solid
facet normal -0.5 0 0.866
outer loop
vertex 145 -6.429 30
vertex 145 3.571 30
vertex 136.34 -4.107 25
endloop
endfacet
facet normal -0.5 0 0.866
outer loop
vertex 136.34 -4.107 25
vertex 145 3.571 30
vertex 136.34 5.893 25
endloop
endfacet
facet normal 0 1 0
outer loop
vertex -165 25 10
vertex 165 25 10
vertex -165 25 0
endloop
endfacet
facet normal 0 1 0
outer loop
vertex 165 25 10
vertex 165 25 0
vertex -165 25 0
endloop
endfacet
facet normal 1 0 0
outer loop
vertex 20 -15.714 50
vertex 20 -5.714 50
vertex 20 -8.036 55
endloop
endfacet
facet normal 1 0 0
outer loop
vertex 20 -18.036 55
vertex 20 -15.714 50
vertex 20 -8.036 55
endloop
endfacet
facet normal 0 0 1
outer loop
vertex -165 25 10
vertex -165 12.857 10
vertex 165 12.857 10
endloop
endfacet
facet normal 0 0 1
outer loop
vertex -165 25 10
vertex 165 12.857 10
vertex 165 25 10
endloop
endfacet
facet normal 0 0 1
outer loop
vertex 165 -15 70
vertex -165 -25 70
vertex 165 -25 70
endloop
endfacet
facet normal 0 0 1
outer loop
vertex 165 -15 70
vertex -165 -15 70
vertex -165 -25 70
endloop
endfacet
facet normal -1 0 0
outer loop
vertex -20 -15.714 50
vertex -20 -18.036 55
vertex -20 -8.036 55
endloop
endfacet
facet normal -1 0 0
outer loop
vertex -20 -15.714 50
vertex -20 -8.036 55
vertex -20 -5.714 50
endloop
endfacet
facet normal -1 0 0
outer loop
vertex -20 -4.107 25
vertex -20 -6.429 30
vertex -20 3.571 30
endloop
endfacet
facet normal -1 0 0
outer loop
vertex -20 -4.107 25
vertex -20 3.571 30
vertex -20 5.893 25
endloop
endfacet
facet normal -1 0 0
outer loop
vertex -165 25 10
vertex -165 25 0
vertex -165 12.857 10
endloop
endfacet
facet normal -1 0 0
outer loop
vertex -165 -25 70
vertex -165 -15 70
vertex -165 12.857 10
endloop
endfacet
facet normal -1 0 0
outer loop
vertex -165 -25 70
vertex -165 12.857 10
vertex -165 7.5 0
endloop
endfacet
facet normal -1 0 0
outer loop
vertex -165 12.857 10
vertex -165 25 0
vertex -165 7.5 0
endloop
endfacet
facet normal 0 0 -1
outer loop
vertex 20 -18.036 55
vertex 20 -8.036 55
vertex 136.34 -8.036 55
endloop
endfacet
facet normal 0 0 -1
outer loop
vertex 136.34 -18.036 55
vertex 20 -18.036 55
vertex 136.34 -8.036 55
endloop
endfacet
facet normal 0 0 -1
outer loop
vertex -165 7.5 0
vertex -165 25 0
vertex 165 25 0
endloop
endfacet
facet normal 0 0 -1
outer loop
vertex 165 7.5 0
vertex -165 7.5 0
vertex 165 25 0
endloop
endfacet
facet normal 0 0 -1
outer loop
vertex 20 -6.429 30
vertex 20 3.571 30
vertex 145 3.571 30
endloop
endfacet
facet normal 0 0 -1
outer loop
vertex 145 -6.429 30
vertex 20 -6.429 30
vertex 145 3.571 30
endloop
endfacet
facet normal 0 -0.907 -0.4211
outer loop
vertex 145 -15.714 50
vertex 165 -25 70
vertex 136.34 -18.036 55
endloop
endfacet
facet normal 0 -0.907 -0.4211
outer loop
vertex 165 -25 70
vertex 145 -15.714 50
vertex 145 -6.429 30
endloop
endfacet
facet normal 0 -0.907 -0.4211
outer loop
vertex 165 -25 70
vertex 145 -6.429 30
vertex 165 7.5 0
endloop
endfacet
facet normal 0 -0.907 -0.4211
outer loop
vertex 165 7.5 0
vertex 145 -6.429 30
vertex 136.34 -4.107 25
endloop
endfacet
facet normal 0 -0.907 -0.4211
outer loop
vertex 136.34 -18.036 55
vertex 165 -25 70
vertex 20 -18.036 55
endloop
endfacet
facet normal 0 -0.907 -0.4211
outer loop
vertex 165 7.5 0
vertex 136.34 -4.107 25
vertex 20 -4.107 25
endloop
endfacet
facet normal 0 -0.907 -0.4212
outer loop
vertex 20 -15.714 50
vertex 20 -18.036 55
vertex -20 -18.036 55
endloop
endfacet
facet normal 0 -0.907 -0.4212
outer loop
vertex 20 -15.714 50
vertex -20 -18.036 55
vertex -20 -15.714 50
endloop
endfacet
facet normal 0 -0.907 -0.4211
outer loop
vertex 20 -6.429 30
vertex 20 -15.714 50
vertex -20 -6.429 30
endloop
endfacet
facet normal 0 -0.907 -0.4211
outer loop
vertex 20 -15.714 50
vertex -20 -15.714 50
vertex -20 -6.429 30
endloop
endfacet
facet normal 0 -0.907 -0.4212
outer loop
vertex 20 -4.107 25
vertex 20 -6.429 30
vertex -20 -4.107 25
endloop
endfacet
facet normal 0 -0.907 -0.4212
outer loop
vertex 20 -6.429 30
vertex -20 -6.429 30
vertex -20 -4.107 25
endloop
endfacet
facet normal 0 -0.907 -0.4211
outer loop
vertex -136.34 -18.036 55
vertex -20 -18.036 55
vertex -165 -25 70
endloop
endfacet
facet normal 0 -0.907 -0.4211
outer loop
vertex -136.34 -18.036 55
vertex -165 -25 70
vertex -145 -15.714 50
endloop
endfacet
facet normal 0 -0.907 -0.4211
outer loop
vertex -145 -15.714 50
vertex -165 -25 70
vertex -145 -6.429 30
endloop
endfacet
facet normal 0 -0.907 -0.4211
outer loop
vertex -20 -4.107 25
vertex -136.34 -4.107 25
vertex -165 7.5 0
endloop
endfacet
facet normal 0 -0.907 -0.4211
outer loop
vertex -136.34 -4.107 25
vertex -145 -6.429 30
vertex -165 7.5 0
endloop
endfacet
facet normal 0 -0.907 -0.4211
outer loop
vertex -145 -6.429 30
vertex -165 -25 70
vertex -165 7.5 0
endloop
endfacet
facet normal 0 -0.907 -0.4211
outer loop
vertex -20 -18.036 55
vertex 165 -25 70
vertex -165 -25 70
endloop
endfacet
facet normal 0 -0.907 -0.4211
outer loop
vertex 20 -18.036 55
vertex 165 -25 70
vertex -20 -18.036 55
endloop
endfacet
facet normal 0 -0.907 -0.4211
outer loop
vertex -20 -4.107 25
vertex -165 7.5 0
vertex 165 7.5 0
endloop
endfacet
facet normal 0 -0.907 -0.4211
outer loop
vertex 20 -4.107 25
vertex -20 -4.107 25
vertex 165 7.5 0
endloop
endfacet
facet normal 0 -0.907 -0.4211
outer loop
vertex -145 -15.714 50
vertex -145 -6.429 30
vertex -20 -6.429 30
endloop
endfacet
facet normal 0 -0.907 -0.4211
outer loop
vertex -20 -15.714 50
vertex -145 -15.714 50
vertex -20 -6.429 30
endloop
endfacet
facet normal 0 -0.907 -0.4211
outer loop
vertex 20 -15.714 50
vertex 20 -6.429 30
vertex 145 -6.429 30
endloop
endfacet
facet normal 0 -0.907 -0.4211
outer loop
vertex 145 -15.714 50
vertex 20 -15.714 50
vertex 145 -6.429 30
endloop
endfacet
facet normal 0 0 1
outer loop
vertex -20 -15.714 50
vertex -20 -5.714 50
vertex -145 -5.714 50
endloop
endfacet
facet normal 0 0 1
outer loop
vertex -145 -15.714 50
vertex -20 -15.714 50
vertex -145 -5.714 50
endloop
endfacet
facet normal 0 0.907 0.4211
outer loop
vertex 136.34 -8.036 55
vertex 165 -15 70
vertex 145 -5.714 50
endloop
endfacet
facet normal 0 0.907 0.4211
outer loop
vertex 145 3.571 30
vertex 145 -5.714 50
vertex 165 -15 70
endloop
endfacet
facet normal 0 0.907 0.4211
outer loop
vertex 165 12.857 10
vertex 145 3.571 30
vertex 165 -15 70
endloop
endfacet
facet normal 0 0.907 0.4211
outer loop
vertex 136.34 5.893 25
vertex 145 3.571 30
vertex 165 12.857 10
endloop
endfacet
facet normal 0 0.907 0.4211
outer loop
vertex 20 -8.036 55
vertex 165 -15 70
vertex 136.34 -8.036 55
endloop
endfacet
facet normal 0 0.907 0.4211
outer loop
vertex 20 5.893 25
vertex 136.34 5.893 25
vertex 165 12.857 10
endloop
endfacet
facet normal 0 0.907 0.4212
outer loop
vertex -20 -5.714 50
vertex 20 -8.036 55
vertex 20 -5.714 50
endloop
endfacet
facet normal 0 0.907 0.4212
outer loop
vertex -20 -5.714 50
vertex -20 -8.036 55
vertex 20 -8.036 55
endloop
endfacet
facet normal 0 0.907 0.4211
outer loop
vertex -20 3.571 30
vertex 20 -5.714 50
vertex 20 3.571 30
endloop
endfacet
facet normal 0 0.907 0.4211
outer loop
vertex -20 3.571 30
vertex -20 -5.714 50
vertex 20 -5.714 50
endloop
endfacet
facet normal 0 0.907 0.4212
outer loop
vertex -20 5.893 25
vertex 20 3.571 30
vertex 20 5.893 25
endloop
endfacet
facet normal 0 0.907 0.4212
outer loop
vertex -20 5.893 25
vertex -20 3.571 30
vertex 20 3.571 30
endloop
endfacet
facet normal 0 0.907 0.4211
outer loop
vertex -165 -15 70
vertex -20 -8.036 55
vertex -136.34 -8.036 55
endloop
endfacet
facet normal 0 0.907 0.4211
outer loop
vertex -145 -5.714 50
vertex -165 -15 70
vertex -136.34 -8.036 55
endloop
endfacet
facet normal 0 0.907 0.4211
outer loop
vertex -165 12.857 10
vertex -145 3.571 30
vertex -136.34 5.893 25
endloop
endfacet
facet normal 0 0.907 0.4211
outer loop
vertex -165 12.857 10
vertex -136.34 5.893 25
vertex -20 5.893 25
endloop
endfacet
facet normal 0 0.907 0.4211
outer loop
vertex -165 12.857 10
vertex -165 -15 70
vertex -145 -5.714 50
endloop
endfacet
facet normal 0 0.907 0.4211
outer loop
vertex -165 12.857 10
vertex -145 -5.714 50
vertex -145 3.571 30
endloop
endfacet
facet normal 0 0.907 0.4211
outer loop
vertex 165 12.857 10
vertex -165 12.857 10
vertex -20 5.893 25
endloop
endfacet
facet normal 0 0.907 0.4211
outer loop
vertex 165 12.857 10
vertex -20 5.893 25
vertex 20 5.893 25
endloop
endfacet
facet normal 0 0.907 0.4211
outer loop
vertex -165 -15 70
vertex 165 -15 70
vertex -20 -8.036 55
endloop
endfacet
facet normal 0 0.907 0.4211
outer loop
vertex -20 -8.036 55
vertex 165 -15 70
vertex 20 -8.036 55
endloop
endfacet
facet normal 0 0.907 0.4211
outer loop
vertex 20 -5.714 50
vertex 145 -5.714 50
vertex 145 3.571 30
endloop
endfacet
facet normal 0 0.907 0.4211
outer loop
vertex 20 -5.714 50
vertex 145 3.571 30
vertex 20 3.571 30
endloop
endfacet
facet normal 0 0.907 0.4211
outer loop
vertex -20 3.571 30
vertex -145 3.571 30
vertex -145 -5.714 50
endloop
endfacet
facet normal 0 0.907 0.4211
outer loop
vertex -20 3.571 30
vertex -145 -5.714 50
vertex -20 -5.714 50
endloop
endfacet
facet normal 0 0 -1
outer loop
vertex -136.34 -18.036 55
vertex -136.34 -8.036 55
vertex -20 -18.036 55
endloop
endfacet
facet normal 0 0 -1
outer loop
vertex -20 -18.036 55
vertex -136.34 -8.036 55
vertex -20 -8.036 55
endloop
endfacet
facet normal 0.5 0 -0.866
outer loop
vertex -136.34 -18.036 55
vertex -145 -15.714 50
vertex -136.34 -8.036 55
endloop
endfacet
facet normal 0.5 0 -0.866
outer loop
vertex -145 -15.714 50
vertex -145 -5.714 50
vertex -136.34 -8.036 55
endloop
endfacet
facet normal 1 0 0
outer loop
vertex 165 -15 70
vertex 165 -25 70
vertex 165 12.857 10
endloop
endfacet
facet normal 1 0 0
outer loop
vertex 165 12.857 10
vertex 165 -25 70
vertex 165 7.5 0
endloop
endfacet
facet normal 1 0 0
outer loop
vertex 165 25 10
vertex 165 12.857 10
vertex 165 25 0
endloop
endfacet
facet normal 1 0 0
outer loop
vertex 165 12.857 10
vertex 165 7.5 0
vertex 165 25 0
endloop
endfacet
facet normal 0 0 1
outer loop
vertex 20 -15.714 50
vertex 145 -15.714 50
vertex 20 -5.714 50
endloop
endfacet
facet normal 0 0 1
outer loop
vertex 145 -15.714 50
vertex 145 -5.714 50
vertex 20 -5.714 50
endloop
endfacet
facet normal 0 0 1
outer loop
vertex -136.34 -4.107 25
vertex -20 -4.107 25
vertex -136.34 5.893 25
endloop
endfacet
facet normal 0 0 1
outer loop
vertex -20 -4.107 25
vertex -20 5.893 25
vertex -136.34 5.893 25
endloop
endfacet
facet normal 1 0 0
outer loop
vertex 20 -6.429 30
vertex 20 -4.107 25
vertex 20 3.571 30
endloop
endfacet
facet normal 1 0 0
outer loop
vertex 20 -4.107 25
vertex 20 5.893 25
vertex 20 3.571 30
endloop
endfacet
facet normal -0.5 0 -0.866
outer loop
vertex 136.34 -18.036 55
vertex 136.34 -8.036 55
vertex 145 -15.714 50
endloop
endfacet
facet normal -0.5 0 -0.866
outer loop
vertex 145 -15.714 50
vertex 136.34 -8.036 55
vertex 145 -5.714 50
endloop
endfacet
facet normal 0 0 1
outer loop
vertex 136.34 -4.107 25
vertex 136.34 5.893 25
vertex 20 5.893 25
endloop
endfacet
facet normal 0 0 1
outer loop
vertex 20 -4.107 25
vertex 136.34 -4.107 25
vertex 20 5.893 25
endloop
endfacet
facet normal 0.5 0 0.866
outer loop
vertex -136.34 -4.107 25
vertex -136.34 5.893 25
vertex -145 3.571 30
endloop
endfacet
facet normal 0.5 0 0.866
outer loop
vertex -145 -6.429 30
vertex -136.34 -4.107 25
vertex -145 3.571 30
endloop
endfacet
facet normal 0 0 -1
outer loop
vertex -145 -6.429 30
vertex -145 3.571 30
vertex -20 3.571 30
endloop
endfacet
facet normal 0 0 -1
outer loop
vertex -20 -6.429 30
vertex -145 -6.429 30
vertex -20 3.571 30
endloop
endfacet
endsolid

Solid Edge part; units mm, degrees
sketch "Sketch1" plane through (0, 0, 0) normal (0, 0, 1) x (1, 0, 0)
  line L0 (-165, -25) -> (165, -25)
  line L1 (165, -25) -> (165, 25)
  line L2 (165, 25) -> (-165, 25)
  line L3 (-165, 25) -> (-165, -25)
  dimension "D1" = 330
  dimension "D2" = 50
extrude "Protrusion1" add sketch "Sketch1" along normal blind 70
sketch "Sketch2" plane through (165, 0, 35) normal (1, 0, 0) x (0, 1, 0)
  line L0 (-25, 35) -> (7.5, -35)
  line L1 (7.5, -35) -> (25, -35)
  line L2 (25, -35) -> (25, -25)
  line L3 (12.8571, -25) -> (25, -25)
  line L4 (-15, 35) -> (12.8571, -25)
  line L5 (-25, 35) -> (-15, 35)
  dimension "D1" = 17.5
  dimension "D2" = 10
  dimension "D3" = 10
extrude "Extrusionsausschnitt_1" cut sketch "Sketch2" along normal mid plane 945.1558 flip side to cut
sketch "Sketch3" plane through (0, -111.4175, 35) normal (0, -1, 0) x (1, 0, 0)
  line L0 (-136.3397, 20) -> (-20, 20)
  line L1 (-20, 20) -> (-20, 15)
  line L2 (-20, 15) -> (-145, 15)
  line L3 (-145, 15) -> (-136.3397, 20)
  line L4 (-145, -5) -> (-20, -5)
  line L5 (-20, -5) -> (-20, -10)
  line L6 (-20, -10) -> (-136.3397, -10)
  line L7 (-136.3397, -10) -> (-145, -5)
  dimension "D1" = 20
  dimension "D2" = 20
  dimension "D3" = 15
  dimension "D4" = 10
  dimension "D5" = 20
  dimension "D6" = 20
  dimension "D7" = 25
  dimension "D8" = 10
extrude "Extrusionsausschnitt_2" cut sketch "Sketch3" along normal mid plane 441.7858
mirror "Mirror1" about plane through (0, 0, 0) normal (1, 0, 0) of "Extrusionsausschnitt_2"
